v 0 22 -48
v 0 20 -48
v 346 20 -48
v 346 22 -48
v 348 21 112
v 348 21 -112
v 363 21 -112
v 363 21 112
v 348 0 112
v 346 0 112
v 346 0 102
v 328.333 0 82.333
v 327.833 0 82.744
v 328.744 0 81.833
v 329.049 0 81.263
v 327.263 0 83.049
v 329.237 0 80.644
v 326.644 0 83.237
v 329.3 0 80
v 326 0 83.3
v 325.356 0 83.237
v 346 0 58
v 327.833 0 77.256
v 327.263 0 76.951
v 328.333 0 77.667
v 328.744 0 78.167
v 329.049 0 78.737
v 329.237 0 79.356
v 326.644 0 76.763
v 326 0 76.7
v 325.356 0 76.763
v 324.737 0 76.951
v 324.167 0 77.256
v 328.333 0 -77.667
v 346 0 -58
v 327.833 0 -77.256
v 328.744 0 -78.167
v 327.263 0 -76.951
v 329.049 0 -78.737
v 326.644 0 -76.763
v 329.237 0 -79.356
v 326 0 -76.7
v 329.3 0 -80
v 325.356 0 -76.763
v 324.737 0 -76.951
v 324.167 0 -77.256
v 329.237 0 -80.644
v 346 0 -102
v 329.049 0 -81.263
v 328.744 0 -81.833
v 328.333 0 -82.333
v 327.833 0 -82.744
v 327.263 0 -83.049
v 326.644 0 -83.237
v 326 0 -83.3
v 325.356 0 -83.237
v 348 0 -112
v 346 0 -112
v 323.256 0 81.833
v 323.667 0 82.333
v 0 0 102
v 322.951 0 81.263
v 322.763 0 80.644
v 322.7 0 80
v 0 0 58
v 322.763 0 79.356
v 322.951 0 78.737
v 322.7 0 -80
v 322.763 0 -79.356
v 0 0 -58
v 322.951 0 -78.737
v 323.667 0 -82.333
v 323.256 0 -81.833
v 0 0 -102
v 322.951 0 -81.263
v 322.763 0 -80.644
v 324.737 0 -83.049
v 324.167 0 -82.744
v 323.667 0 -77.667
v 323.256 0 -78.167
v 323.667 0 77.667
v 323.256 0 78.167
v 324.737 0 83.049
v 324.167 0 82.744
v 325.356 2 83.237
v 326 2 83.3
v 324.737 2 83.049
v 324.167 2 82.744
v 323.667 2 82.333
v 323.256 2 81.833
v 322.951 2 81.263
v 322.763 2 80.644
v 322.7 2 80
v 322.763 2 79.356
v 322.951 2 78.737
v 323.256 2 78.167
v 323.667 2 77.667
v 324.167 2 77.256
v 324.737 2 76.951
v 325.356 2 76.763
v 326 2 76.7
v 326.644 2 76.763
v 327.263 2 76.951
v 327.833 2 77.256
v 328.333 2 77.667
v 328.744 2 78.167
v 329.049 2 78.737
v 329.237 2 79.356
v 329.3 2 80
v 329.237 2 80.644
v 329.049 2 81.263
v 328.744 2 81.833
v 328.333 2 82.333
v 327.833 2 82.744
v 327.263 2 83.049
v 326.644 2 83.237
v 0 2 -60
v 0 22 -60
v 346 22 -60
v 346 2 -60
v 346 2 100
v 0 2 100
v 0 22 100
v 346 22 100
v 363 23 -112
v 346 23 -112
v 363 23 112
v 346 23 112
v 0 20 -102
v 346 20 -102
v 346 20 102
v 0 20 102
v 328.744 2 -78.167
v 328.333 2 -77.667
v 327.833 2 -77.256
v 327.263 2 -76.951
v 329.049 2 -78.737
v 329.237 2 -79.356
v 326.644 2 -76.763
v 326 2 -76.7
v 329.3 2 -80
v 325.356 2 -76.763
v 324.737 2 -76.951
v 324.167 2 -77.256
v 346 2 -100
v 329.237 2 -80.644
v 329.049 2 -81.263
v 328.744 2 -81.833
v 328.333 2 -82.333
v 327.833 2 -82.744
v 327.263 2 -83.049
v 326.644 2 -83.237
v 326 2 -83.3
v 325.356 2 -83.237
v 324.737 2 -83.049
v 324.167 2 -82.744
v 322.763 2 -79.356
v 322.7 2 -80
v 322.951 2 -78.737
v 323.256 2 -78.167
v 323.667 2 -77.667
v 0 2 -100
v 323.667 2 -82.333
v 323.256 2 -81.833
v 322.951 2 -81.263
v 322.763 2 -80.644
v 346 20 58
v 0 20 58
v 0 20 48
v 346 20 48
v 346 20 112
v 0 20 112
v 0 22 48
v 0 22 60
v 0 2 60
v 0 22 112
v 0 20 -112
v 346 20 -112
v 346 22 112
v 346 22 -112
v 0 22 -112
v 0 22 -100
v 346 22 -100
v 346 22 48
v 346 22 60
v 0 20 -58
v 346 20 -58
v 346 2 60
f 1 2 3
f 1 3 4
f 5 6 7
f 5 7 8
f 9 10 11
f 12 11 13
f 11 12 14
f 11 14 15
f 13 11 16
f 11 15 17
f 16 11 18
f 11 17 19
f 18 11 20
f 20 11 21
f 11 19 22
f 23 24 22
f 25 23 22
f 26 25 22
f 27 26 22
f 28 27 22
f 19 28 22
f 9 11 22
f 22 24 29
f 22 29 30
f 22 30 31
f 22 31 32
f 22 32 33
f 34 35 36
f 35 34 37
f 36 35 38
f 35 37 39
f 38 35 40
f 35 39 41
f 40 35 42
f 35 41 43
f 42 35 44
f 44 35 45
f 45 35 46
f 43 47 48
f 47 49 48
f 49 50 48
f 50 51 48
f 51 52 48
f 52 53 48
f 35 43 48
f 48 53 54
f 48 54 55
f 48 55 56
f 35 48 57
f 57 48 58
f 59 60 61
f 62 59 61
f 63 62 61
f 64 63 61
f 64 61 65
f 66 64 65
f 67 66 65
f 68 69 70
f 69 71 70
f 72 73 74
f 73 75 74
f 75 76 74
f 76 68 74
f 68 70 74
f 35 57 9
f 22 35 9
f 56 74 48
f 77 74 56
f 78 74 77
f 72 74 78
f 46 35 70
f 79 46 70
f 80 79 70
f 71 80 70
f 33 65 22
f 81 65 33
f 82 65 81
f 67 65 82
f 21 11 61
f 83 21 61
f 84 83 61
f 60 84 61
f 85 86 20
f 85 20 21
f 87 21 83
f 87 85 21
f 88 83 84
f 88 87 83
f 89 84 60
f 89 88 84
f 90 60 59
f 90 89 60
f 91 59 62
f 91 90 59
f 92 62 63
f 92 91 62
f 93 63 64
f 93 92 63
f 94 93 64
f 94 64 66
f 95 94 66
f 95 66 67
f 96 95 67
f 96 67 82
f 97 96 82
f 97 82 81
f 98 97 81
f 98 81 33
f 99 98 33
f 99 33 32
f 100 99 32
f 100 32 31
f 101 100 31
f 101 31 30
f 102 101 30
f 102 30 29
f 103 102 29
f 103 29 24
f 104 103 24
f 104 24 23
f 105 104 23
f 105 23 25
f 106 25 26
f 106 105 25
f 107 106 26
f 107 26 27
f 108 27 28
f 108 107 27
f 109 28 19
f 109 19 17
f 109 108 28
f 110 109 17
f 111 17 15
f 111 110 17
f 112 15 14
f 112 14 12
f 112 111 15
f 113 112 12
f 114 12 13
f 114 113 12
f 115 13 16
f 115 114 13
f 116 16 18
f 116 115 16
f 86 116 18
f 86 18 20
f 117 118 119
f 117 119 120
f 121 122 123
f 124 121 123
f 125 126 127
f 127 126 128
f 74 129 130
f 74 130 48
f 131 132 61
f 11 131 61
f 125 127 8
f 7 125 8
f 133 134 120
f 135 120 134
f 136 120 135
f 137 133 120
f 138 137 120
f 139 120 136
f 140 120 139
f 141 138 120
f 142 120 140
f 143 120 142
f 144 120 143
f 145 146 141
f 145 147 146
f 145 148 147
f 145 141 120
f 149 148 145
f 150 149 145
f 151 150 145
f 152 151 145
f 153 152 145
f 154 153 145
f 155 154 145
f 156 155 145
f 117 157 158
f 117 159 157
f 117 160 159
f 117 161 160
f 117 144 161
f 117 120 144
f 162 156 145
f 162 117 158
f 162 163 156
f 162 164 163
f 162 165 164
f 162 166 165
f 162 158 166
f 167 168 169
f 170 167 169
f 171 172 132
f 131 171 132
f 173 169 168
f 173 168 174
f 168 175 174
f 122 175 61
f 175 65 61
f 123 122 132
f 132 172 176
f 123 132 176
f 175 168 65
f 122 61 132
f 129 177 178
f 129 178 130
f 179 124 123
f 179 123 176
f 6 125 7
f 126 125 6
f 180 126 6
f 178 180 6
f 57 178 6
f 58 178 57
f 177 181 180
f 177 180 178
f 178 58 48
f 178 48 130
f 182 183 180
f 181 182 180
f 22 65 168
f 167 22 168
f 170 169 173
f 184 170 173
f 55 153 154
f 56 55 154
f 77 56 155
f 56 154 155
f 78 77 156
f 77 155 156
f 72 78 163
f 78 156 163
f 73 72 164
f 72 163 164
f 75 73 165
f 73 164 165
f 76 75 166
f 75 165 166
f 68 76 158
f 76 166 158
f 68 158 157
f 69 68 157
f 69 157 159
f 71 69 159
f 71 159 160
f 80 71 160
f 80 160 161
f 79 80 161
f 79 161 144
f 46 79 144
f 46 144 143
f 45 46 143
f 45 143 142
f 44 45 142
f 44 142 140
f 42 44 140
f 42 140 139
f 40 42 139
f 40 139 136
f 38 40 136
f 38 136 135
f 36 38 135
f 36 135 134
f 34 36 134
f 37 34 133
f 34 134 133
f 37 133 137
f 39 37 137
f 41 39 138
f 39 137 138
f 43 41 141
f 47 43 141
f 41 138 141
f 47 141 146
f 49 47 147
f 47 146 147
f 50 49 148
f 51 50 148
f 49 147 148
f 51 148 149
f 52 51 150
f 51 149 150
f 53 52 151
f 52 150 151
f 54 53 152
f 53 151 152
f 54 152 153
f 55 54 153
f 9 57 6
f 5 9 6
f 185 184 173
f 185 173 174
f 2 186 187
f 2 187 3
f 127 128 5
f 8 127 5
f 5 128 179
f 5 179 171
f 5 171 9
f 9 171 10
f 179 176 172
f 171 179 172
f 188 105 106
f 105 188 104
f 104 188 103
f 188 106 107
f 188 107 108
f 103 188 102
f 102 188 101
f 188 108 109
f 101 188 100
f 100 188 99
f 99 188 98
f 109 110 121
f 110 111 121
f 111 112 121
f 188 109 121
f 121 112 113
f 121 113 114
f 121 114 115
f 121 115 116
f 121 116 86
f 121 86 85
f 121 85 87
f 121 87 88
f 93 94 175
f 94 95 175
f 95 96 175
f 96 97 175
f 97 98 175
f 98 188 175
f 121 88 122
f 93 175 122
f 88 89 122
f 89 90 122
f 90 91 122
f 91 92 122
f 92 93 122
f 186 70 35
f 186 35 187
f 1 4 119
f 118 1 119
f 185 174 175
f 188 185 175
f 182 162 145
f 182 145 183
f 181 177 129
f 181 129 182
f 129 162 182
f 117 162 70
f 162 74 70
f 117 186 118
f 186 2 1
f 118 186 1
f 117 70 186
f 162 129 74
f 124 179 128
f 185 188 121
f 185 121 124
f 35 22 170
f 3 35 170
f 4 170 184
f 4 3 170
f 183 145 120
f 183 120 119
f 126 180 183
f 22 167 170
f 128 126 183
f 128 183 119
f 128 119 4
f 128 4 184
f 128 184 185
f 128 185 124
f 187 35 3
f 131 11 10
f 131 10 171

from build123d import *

# Parameters (mm, degrees)
EXTRUDE_THIN1_DEPTH     = 346
SKETCH5_R               = 3.3
CUT_EXTRUDE1_DEPTH      = 365.225205059
CUT_EXTRUDE1_DEPTH_BACK = 365.225205059
SKETCH6_W               = 23
SKETCH6_H               = 224
BOSS_EXTRUDE2_DEPTH     = 2
SKETCH8_W               = 2
SKETCH8_H               = 224
EXTRUDE_THIN2_DEPTH     = 15


with BuildPart() as part:
    # Sketch2 → Extrude-Thin1 (new body)
    with BuildSketch(Plane.YZ):
        Polygon((20, 112), (20, 102), (0, 102), (0, 58), (20, 58), (20, 48), (22, 48), (22, 60), (2, 60), (2, 100), (22, 100), (22, 112), align=None)
    extrude(amount=-EXTRUDE_THIN1_DEPTH)

    # Sketch5 → Cut-Extrude1 (cut, two sides)
    with BuildSketch(Plane(origin=(0, 2, 0), x_dir=(-1, 0, 0), z_dir=(0, 1, 0))) as cut_extrude1_sk:
        with Locations(Location((326, 80, 0), (0, 0, 90))):
            Circle(SKETCH5_R)
    extrude(amount=CUT_EXTRUDE1_DEPTH, mode=Mode.SUBTRACT)
    extrude(cut_extrude1_sk.sketch, amount=-CUT_EXTRUDE1_DEPTH_BACK, mode=Mode.SUBTRACT)


with BuildPart() as body_2:
    # Mirror1: mirrored copy
    add(part.part.mirror(Plane.XY))


with BuildPart() as part_1:
    add(part.part)

    add(body_2.part)  # Boss-Extrude2 merges body 2
    # Sketch6 → Boss-Extrude2 (add)
    with BuildSketch(Plane(origin=(-346, 0, 0), x_dir=(0, 1, 0), z_dir=(-1, 0, 0))):
        with Locations((11.5, 0)):
            Rectangle(SKETCH6_W, SKETCH6_H)
    extrude(amount=BOSS_EXTRUDE2_DEPTH)

    # Sketch8 → Extrude-Thin2 (add)
    with BuildSketch(Plane(origin=(-348, 0, 0), x_dir=(0, -1, 0), z_dir=(-1, 0, 0))):
        with Locations((-22, 0)):
            Rectangle(SKETCH8_W, SKETCH8_H)
    extrude(amount=EXTRUDE_THIN2_DEPTH)

    # Mirror2: part across plane


with BuildPart() as part_2:
    add(part_1.part)
    add(part_1.part.mirror(Plane(origin=(0, 0, 0), x_dir=(0, 0, 1), z_dir=(1, 0, 0))))

    # SurfaceCut1
    split(bisect_by=Plane.YZ, keep=Keep.TOP)


solid = part_2.part
